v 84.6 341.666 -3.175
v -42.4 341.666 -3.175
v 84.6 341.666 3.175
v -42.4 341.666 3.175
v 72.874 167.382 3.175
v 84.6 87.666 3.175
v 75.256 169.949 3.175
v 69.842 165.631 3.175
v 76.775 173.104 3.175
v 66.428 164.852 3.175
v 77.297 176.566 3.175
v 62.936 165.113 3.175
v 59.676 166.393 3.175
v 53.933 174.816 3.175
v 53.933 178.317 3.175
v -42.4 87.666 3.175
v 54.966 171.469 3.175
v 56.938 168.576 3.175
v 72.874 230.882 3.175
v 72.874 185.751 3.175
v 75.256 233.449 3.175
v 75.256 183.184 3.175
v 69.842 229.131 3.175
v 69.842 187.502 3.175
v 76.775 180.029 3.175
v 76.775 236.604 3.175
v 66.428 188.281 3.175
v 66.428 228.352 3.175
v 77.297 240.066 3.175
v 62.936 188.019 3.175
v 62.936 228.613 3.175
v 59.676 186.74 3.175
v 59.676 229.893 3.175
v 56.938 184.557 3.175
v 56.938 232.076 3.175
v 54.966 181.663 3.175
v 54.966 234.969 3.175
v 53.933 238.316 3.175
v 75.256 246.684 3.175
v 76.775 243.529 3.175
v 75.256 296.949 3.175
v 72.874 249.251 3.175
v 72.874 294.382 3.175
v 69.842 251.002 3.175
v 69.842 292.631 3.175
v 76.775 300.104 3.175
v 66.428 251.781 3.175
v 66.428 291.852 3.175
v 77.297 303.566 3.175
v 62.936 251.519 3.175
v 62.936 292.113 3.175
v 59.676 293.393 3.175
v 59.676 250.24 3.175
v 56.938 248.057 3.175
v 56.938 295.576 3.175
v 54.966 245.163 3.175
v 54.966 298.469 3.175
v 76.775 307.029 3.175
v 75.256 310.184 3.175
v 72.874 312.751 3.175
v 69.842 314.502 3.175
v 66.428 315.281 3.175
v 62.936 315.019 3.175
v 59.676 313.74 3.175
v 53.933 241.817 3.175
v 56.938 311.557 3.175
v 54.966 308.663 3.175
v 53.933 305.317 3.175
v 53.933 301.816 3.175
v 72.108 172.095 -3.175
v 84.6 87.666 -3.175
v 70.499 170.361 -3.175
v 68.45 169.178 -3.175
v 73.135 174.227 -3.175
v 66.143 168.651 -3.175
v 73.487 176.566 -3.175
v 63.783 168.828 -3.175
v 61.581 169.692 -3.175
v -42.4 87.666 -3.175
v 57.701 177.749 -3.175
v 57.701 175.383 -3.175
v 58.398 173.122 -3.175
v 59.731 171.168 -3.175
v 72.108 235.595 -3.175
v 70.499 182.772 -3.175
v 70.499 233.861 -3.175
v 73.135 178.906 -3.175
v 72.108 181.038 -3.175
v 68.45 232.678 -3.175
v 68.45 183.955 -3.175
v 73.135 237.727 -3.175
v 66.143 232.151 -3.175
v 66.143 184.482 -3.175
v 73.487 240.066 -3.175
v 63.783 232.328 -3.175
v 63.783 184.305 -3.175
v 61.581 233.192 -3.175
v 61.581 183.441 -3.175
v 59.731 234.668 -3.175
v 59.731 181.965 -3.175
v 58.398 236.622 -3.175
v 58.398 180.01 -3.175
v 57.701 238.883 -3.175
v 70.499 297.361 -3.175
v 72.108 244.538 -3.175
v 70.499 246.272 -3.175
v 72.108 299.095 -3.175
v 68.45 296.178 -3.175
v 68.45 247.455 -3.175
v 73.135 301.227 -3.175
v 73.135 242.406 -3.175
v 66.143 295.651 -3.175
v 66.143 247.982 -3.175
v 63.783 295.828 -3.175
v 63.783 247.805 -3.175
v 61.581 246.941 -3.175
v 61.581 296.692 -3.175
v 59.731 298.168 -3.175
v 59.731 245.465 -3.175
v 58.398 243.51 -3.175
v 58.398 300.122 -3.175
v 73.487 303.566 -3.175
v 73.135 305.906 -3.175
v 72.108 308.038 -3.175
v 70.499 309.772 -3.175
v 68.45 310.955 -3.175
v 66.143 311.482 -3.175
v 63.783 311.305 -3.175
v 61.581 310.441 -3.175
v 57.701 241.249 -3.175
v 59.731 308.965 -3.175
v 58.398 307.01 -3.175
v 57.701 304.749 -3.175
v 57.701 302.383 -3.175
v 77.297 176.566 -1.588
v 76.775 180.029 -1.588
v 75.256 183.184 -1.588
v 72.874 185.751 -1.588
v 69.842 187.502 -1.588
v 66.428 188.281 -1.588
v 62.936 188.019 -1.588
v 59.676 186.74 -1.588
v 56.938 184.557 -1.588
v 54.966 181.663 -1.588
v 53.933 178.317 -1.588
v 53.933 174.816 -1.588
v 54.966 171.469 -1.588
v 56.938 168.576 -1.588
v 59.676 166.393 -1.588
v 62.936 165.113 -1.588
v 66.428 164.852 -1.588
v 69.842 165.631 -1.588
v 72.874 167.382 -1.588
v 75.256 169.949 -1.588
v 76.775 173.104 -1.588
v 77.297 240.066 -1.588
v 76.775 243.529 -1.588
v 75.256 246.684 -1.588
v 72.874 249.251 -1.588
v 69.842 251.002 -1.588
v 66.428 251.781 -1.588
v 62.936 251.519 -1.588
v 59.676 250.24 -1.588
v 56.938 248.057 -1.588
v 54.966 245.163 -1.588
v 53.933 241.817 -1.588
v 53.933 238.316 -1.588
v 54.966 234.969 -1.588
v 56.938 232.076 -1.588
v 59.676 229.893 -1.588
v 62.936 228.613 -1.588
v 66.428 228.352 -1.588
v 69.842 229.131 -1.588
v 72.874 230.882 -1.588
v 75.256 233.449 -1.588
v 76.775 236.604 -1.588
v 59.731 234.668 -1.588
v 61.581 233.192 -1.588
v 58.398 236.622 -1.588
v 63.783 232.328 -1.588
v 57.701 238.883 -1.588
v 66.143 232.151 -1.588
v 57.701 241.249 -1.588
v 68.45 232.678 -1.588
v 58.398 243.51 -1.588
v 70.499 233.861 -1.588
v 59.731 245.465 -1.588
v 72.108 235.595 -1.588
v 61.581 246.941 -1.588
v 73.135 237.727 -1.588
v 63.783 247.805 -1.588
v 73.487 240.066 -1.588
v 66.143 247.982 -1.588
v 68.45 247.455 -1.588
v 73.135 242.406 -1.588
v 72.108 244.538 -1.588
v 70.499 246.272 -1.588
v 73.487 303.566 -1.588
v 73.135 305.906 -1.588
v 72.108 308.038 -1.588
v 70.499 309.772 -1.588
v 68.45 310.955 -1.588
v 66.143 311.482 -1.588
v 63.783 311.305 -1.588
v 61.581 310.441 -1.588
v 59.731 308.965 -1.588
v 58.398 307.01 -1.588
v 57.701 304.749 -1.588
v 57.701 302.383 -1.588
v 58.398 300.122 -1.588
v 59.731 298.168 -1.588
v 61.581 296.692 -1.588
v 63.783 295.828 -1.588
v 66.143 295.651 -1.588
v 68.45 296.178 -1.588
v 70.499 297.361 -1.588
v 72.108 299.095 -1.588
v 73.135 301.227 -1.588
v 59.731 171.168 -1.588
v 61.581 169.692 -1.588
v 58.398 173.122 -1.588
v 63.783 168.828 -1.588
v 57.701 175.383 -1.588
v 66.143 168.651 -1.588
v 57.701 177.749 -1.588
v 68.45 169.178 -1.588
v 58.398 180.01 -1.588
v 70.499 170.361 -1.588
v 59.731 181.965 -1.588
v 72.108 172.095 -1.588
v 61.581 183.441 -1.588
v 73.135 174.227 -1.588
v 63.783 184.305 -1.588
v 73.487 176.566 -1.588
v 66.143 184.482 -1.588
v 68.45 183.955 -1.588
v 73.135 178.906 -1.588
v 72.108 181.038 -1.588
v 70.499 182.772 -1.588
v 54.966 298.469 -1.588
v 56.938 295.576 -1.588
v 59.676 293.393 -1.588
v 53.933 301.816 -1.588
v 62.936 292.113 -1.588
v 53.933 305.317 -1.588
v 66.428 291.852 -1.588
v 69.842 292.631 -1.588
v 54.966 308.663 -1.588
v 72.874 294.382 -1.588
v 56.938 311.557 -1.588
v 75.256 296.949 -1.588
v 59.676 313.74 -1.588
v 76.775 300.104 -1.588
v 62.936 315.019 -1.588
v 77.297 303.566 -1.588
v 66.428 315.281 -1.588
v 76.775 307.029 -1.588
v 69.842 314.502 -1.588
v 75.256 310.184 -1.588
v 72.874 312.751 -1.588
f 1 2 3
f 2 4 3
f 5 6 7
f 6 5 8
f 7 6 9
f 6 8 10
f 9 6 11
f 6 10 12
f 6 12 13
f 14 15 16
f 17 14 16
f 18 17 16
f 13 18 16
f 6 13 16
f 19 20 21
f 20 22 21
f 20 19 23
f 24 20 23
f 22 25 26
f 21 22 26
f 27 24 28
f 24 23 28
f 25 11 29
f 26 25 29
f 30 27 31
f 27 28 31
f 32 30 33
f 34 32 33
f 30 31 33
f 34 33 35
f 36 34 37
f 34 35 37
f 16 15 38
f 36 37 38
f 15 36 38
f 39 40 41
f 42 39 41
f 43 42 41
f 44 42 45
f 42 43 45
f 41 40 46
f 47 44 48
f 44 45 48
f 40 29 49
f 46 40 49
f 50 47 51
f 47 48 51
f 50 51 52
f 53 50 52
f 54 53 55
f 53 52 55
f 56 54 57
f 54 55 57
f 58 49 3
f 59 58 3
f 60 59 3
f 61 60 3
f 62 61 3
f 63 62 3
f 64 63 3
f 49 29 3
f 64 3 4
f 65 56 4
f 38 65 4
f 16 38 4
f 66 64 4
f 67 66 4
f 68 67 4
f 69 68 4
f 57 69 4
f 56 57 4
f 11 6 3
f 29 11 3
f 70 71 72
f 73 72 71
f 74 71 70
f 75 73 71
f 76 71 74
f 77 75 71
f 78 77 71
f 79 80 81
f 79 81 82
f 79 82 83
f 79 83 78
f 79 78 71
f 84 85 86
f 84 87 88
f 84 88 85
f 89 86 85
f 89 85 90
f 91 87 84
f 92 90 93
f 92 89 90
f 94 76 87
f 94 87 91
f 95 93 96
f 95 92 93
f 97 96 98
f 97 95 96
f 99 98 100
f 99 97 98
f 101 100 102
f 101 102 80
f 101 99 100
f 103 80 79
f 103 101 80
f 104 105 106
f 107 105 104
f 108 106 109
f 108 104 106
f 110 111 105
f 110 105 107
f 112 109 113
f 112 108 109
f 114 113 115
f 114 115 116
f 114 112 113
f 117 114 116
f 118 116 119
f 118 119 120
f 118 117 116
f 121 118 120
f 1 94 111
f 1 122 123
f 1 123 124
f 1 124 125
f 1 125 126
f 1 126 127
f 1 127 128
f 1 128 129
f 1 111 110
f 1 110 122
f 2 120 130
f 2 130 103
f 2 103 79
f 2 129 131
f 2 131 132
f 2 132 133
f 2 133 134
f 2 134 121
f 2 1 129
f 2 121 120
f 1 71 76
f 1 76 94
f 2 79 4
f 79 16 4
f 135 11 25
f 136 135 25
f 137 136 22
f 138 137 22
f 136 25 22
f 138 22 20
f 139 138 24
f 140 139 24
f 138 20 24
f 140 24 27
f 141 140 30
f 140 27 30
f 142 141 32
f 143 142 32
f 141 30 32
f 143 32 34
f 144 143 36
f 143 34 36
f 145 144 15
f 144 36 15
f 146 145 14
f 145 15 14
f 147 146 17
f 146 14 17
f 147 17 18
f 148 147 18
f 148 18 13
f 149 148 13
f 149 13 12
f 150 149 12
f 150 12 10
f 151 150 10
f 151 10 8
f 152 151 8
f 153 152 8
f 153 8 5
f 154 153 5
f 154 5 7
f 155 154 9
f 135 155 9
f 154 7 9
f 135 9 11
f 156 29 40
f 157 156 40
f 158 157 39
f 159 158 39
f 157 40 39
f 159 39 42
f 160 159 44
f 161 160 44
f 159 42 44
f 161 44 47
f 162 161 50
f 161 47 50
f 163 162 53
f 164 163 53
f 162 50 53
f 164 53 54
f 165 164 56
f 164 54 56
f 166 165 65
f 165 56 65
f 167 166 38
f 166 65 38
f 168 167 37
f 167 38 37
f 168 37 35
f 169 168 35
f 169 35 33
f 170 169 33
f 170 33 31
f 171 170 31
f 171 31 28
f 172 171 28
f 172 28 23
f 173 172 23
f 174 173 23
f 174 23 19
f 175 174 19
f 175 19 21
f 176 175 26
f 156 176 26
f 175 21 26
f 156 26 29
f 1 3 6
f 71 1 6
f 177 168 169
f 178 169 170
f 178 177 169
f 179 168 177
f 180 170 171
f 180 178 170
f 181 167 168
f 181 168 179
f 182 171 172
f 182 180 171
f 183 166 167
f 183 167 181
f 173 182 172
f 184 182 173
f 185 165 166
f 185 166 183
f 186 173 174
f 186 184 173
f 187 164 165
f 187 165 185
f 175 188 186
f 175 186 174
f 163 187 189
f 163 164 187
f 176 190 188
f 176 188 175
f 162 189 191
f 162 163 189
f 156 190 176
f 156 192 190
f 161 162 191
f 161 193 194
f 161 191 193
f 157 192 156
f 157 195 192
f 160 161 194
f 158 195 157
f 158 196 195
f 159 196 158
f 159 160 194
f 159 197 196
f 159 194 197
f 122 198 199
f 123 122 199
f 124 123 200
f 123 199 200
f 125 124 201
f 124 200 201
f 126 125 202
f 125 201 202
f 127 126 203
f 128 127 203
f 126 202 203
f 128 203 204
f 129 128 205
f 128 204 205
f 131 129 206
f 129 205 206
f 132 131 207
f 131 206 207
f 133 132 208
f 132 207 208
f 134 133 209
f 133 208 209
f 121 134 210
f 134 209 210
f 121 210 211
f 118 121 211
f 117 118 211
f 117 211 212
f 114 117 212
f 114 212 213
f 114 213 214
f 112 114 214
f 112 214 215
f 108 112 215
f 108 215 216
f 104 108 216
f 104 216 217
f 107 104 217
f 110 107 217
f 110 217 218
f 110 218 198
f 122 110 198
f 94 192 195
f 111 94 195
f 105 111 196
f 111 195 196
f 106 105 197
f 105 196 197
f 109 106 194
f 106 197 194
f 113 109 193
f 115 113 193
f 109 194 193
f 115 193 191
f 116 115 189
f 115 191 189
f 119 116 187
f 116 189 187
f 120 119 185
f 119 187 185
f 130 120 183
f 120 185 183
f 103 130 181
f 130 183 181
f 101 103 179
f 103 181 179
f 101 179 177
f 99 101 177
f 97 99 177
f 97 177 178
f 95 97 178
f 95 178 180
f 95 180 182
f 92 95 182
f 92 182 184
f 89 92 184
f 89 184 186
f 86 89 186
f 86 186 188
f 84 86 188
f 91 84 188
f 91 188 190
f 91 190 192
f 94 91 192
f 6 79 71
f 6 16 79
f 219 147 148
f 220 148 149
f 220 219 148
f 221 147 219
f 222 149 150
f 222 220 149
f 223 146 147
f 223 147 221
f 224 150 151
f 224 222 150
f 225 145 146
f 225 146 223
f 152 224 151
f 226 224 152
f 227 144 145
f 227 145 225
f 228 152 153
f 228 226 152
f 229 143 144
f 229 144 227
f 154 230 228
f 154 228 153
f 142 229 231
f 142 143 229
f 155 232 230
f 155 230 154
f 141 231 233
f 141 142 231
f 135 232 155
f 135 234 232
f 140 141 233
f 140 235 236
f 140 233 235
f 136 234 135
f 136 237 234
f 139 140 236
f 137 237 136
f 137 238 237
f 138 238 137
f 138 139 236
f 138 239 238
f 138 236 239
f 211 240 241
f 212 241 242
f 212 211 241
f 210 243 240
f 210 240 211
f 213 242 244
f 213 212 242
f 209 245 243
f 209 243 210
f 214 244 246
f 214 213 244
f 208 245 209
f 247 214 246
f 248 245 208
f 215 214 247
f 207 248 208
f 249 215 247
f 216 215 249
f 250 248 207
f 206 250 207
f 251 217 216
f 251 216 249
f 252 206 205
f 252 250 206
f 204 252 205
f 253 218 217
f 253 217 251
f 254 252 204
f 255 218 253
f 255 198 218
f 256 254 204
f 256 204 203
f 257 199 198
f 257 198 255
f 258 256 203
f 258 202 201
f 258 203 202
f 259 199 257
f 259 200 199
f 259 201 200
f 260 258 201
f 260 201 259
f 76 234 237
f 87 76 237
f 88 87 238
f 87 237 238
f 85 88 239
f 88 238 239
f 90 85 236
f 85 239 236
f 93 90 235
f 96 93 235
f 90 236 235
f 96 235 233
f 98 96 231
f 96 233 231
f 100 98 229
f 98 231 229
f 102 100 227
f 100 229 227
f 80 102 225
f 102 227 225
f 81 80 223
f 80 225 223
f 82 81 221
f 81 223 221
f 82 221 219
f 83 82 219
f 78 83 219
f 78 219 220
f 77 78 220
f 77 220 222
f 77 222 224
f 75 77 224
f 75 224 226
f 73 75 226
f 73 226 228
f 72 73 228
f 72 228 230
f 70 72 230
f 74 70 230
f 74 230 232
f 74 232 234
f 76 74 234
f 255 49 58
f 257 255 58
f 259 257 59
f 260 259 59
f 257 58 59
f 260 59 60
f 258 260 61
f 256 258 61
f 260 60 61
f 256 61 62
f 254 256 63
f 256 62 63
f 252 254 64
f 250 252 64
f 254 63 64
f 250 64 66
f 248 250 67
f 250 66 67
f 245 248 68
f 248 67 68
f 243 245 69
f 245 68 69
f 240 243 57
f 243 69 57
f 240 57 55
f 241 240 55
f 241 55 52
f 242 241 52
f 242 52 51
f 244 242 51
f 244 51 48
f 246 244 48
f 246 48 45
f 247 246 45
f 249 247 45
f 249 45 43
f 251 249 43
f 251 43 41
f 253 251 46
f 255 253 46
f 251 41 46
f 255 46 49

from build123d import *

# Parameters (mm, degrees)
BOSS_EXTRUDE1_DEPTH = 3.175
SKETCH4_R           = 11.7475
CUT_EXTRUDE1_DEPTH  = 4.7625
SKETCH5_R           = 7.9375
CUT_EXTRUDE2_DEPTH  = 2.5875
LPATTERN1_COUNT     = 3
LPATTERN1_PITCH     = 63.5


with BuildPart() as part:
    # Sketch3 → Boss-Extrude1 (new body, symmetric)
    with BuildSketch(Plane(origin=(65.549733265, 163.86644962, 0), x_dir=(1, 0, 0), z_dir=(0, 0, 1))):
        Polygon((19.05, -76.2), (0, -76.2), (-107.95, -76.2), (-107.95, 177.8), (19.05, 177.8), align=None)
    extrude(amount=BOSS_EXTRUDE1_DEPTH, both=True)

    # Sketch4 → Cut-Extrude1 (cut)
    with BuildSketch(Plane.XY.offset(3.175)):
        with Locations((65.549733265, 176.56644962)):
            Circle(SKETCH4_R)
    cut_extrude1 = extrude(amount=-CUT_EXTRUDE1_DEPTH, mode=Mode.SUBTRACT)

    # Sketch5 → Cut-Extrude2 (cut, through all)
    with BuildSketch(Plane.XY.offset(-1.5875)):
        with Locations((65.549733265, 176.56644962)):
            Circle(SKETCH5_R)
    cut_extrude2 = extrude(amount=-CUT_EXTRUDE2_DEPTH, mode=Mode.SUBTRACT)

    # LPattern1: Cut-Extrude1, Cut-Extrude2 ×3
    with Locations(*[(0, i * LPATTERN1_PITCH, 0) for i in range(1, LPATTERN1_COUNT)]):
        add(cut_extrude1, mode=Mode.SUBTRACT)
        add(cut_extrude2, mode=Mode.SUBTRACT)


solid = part.part
